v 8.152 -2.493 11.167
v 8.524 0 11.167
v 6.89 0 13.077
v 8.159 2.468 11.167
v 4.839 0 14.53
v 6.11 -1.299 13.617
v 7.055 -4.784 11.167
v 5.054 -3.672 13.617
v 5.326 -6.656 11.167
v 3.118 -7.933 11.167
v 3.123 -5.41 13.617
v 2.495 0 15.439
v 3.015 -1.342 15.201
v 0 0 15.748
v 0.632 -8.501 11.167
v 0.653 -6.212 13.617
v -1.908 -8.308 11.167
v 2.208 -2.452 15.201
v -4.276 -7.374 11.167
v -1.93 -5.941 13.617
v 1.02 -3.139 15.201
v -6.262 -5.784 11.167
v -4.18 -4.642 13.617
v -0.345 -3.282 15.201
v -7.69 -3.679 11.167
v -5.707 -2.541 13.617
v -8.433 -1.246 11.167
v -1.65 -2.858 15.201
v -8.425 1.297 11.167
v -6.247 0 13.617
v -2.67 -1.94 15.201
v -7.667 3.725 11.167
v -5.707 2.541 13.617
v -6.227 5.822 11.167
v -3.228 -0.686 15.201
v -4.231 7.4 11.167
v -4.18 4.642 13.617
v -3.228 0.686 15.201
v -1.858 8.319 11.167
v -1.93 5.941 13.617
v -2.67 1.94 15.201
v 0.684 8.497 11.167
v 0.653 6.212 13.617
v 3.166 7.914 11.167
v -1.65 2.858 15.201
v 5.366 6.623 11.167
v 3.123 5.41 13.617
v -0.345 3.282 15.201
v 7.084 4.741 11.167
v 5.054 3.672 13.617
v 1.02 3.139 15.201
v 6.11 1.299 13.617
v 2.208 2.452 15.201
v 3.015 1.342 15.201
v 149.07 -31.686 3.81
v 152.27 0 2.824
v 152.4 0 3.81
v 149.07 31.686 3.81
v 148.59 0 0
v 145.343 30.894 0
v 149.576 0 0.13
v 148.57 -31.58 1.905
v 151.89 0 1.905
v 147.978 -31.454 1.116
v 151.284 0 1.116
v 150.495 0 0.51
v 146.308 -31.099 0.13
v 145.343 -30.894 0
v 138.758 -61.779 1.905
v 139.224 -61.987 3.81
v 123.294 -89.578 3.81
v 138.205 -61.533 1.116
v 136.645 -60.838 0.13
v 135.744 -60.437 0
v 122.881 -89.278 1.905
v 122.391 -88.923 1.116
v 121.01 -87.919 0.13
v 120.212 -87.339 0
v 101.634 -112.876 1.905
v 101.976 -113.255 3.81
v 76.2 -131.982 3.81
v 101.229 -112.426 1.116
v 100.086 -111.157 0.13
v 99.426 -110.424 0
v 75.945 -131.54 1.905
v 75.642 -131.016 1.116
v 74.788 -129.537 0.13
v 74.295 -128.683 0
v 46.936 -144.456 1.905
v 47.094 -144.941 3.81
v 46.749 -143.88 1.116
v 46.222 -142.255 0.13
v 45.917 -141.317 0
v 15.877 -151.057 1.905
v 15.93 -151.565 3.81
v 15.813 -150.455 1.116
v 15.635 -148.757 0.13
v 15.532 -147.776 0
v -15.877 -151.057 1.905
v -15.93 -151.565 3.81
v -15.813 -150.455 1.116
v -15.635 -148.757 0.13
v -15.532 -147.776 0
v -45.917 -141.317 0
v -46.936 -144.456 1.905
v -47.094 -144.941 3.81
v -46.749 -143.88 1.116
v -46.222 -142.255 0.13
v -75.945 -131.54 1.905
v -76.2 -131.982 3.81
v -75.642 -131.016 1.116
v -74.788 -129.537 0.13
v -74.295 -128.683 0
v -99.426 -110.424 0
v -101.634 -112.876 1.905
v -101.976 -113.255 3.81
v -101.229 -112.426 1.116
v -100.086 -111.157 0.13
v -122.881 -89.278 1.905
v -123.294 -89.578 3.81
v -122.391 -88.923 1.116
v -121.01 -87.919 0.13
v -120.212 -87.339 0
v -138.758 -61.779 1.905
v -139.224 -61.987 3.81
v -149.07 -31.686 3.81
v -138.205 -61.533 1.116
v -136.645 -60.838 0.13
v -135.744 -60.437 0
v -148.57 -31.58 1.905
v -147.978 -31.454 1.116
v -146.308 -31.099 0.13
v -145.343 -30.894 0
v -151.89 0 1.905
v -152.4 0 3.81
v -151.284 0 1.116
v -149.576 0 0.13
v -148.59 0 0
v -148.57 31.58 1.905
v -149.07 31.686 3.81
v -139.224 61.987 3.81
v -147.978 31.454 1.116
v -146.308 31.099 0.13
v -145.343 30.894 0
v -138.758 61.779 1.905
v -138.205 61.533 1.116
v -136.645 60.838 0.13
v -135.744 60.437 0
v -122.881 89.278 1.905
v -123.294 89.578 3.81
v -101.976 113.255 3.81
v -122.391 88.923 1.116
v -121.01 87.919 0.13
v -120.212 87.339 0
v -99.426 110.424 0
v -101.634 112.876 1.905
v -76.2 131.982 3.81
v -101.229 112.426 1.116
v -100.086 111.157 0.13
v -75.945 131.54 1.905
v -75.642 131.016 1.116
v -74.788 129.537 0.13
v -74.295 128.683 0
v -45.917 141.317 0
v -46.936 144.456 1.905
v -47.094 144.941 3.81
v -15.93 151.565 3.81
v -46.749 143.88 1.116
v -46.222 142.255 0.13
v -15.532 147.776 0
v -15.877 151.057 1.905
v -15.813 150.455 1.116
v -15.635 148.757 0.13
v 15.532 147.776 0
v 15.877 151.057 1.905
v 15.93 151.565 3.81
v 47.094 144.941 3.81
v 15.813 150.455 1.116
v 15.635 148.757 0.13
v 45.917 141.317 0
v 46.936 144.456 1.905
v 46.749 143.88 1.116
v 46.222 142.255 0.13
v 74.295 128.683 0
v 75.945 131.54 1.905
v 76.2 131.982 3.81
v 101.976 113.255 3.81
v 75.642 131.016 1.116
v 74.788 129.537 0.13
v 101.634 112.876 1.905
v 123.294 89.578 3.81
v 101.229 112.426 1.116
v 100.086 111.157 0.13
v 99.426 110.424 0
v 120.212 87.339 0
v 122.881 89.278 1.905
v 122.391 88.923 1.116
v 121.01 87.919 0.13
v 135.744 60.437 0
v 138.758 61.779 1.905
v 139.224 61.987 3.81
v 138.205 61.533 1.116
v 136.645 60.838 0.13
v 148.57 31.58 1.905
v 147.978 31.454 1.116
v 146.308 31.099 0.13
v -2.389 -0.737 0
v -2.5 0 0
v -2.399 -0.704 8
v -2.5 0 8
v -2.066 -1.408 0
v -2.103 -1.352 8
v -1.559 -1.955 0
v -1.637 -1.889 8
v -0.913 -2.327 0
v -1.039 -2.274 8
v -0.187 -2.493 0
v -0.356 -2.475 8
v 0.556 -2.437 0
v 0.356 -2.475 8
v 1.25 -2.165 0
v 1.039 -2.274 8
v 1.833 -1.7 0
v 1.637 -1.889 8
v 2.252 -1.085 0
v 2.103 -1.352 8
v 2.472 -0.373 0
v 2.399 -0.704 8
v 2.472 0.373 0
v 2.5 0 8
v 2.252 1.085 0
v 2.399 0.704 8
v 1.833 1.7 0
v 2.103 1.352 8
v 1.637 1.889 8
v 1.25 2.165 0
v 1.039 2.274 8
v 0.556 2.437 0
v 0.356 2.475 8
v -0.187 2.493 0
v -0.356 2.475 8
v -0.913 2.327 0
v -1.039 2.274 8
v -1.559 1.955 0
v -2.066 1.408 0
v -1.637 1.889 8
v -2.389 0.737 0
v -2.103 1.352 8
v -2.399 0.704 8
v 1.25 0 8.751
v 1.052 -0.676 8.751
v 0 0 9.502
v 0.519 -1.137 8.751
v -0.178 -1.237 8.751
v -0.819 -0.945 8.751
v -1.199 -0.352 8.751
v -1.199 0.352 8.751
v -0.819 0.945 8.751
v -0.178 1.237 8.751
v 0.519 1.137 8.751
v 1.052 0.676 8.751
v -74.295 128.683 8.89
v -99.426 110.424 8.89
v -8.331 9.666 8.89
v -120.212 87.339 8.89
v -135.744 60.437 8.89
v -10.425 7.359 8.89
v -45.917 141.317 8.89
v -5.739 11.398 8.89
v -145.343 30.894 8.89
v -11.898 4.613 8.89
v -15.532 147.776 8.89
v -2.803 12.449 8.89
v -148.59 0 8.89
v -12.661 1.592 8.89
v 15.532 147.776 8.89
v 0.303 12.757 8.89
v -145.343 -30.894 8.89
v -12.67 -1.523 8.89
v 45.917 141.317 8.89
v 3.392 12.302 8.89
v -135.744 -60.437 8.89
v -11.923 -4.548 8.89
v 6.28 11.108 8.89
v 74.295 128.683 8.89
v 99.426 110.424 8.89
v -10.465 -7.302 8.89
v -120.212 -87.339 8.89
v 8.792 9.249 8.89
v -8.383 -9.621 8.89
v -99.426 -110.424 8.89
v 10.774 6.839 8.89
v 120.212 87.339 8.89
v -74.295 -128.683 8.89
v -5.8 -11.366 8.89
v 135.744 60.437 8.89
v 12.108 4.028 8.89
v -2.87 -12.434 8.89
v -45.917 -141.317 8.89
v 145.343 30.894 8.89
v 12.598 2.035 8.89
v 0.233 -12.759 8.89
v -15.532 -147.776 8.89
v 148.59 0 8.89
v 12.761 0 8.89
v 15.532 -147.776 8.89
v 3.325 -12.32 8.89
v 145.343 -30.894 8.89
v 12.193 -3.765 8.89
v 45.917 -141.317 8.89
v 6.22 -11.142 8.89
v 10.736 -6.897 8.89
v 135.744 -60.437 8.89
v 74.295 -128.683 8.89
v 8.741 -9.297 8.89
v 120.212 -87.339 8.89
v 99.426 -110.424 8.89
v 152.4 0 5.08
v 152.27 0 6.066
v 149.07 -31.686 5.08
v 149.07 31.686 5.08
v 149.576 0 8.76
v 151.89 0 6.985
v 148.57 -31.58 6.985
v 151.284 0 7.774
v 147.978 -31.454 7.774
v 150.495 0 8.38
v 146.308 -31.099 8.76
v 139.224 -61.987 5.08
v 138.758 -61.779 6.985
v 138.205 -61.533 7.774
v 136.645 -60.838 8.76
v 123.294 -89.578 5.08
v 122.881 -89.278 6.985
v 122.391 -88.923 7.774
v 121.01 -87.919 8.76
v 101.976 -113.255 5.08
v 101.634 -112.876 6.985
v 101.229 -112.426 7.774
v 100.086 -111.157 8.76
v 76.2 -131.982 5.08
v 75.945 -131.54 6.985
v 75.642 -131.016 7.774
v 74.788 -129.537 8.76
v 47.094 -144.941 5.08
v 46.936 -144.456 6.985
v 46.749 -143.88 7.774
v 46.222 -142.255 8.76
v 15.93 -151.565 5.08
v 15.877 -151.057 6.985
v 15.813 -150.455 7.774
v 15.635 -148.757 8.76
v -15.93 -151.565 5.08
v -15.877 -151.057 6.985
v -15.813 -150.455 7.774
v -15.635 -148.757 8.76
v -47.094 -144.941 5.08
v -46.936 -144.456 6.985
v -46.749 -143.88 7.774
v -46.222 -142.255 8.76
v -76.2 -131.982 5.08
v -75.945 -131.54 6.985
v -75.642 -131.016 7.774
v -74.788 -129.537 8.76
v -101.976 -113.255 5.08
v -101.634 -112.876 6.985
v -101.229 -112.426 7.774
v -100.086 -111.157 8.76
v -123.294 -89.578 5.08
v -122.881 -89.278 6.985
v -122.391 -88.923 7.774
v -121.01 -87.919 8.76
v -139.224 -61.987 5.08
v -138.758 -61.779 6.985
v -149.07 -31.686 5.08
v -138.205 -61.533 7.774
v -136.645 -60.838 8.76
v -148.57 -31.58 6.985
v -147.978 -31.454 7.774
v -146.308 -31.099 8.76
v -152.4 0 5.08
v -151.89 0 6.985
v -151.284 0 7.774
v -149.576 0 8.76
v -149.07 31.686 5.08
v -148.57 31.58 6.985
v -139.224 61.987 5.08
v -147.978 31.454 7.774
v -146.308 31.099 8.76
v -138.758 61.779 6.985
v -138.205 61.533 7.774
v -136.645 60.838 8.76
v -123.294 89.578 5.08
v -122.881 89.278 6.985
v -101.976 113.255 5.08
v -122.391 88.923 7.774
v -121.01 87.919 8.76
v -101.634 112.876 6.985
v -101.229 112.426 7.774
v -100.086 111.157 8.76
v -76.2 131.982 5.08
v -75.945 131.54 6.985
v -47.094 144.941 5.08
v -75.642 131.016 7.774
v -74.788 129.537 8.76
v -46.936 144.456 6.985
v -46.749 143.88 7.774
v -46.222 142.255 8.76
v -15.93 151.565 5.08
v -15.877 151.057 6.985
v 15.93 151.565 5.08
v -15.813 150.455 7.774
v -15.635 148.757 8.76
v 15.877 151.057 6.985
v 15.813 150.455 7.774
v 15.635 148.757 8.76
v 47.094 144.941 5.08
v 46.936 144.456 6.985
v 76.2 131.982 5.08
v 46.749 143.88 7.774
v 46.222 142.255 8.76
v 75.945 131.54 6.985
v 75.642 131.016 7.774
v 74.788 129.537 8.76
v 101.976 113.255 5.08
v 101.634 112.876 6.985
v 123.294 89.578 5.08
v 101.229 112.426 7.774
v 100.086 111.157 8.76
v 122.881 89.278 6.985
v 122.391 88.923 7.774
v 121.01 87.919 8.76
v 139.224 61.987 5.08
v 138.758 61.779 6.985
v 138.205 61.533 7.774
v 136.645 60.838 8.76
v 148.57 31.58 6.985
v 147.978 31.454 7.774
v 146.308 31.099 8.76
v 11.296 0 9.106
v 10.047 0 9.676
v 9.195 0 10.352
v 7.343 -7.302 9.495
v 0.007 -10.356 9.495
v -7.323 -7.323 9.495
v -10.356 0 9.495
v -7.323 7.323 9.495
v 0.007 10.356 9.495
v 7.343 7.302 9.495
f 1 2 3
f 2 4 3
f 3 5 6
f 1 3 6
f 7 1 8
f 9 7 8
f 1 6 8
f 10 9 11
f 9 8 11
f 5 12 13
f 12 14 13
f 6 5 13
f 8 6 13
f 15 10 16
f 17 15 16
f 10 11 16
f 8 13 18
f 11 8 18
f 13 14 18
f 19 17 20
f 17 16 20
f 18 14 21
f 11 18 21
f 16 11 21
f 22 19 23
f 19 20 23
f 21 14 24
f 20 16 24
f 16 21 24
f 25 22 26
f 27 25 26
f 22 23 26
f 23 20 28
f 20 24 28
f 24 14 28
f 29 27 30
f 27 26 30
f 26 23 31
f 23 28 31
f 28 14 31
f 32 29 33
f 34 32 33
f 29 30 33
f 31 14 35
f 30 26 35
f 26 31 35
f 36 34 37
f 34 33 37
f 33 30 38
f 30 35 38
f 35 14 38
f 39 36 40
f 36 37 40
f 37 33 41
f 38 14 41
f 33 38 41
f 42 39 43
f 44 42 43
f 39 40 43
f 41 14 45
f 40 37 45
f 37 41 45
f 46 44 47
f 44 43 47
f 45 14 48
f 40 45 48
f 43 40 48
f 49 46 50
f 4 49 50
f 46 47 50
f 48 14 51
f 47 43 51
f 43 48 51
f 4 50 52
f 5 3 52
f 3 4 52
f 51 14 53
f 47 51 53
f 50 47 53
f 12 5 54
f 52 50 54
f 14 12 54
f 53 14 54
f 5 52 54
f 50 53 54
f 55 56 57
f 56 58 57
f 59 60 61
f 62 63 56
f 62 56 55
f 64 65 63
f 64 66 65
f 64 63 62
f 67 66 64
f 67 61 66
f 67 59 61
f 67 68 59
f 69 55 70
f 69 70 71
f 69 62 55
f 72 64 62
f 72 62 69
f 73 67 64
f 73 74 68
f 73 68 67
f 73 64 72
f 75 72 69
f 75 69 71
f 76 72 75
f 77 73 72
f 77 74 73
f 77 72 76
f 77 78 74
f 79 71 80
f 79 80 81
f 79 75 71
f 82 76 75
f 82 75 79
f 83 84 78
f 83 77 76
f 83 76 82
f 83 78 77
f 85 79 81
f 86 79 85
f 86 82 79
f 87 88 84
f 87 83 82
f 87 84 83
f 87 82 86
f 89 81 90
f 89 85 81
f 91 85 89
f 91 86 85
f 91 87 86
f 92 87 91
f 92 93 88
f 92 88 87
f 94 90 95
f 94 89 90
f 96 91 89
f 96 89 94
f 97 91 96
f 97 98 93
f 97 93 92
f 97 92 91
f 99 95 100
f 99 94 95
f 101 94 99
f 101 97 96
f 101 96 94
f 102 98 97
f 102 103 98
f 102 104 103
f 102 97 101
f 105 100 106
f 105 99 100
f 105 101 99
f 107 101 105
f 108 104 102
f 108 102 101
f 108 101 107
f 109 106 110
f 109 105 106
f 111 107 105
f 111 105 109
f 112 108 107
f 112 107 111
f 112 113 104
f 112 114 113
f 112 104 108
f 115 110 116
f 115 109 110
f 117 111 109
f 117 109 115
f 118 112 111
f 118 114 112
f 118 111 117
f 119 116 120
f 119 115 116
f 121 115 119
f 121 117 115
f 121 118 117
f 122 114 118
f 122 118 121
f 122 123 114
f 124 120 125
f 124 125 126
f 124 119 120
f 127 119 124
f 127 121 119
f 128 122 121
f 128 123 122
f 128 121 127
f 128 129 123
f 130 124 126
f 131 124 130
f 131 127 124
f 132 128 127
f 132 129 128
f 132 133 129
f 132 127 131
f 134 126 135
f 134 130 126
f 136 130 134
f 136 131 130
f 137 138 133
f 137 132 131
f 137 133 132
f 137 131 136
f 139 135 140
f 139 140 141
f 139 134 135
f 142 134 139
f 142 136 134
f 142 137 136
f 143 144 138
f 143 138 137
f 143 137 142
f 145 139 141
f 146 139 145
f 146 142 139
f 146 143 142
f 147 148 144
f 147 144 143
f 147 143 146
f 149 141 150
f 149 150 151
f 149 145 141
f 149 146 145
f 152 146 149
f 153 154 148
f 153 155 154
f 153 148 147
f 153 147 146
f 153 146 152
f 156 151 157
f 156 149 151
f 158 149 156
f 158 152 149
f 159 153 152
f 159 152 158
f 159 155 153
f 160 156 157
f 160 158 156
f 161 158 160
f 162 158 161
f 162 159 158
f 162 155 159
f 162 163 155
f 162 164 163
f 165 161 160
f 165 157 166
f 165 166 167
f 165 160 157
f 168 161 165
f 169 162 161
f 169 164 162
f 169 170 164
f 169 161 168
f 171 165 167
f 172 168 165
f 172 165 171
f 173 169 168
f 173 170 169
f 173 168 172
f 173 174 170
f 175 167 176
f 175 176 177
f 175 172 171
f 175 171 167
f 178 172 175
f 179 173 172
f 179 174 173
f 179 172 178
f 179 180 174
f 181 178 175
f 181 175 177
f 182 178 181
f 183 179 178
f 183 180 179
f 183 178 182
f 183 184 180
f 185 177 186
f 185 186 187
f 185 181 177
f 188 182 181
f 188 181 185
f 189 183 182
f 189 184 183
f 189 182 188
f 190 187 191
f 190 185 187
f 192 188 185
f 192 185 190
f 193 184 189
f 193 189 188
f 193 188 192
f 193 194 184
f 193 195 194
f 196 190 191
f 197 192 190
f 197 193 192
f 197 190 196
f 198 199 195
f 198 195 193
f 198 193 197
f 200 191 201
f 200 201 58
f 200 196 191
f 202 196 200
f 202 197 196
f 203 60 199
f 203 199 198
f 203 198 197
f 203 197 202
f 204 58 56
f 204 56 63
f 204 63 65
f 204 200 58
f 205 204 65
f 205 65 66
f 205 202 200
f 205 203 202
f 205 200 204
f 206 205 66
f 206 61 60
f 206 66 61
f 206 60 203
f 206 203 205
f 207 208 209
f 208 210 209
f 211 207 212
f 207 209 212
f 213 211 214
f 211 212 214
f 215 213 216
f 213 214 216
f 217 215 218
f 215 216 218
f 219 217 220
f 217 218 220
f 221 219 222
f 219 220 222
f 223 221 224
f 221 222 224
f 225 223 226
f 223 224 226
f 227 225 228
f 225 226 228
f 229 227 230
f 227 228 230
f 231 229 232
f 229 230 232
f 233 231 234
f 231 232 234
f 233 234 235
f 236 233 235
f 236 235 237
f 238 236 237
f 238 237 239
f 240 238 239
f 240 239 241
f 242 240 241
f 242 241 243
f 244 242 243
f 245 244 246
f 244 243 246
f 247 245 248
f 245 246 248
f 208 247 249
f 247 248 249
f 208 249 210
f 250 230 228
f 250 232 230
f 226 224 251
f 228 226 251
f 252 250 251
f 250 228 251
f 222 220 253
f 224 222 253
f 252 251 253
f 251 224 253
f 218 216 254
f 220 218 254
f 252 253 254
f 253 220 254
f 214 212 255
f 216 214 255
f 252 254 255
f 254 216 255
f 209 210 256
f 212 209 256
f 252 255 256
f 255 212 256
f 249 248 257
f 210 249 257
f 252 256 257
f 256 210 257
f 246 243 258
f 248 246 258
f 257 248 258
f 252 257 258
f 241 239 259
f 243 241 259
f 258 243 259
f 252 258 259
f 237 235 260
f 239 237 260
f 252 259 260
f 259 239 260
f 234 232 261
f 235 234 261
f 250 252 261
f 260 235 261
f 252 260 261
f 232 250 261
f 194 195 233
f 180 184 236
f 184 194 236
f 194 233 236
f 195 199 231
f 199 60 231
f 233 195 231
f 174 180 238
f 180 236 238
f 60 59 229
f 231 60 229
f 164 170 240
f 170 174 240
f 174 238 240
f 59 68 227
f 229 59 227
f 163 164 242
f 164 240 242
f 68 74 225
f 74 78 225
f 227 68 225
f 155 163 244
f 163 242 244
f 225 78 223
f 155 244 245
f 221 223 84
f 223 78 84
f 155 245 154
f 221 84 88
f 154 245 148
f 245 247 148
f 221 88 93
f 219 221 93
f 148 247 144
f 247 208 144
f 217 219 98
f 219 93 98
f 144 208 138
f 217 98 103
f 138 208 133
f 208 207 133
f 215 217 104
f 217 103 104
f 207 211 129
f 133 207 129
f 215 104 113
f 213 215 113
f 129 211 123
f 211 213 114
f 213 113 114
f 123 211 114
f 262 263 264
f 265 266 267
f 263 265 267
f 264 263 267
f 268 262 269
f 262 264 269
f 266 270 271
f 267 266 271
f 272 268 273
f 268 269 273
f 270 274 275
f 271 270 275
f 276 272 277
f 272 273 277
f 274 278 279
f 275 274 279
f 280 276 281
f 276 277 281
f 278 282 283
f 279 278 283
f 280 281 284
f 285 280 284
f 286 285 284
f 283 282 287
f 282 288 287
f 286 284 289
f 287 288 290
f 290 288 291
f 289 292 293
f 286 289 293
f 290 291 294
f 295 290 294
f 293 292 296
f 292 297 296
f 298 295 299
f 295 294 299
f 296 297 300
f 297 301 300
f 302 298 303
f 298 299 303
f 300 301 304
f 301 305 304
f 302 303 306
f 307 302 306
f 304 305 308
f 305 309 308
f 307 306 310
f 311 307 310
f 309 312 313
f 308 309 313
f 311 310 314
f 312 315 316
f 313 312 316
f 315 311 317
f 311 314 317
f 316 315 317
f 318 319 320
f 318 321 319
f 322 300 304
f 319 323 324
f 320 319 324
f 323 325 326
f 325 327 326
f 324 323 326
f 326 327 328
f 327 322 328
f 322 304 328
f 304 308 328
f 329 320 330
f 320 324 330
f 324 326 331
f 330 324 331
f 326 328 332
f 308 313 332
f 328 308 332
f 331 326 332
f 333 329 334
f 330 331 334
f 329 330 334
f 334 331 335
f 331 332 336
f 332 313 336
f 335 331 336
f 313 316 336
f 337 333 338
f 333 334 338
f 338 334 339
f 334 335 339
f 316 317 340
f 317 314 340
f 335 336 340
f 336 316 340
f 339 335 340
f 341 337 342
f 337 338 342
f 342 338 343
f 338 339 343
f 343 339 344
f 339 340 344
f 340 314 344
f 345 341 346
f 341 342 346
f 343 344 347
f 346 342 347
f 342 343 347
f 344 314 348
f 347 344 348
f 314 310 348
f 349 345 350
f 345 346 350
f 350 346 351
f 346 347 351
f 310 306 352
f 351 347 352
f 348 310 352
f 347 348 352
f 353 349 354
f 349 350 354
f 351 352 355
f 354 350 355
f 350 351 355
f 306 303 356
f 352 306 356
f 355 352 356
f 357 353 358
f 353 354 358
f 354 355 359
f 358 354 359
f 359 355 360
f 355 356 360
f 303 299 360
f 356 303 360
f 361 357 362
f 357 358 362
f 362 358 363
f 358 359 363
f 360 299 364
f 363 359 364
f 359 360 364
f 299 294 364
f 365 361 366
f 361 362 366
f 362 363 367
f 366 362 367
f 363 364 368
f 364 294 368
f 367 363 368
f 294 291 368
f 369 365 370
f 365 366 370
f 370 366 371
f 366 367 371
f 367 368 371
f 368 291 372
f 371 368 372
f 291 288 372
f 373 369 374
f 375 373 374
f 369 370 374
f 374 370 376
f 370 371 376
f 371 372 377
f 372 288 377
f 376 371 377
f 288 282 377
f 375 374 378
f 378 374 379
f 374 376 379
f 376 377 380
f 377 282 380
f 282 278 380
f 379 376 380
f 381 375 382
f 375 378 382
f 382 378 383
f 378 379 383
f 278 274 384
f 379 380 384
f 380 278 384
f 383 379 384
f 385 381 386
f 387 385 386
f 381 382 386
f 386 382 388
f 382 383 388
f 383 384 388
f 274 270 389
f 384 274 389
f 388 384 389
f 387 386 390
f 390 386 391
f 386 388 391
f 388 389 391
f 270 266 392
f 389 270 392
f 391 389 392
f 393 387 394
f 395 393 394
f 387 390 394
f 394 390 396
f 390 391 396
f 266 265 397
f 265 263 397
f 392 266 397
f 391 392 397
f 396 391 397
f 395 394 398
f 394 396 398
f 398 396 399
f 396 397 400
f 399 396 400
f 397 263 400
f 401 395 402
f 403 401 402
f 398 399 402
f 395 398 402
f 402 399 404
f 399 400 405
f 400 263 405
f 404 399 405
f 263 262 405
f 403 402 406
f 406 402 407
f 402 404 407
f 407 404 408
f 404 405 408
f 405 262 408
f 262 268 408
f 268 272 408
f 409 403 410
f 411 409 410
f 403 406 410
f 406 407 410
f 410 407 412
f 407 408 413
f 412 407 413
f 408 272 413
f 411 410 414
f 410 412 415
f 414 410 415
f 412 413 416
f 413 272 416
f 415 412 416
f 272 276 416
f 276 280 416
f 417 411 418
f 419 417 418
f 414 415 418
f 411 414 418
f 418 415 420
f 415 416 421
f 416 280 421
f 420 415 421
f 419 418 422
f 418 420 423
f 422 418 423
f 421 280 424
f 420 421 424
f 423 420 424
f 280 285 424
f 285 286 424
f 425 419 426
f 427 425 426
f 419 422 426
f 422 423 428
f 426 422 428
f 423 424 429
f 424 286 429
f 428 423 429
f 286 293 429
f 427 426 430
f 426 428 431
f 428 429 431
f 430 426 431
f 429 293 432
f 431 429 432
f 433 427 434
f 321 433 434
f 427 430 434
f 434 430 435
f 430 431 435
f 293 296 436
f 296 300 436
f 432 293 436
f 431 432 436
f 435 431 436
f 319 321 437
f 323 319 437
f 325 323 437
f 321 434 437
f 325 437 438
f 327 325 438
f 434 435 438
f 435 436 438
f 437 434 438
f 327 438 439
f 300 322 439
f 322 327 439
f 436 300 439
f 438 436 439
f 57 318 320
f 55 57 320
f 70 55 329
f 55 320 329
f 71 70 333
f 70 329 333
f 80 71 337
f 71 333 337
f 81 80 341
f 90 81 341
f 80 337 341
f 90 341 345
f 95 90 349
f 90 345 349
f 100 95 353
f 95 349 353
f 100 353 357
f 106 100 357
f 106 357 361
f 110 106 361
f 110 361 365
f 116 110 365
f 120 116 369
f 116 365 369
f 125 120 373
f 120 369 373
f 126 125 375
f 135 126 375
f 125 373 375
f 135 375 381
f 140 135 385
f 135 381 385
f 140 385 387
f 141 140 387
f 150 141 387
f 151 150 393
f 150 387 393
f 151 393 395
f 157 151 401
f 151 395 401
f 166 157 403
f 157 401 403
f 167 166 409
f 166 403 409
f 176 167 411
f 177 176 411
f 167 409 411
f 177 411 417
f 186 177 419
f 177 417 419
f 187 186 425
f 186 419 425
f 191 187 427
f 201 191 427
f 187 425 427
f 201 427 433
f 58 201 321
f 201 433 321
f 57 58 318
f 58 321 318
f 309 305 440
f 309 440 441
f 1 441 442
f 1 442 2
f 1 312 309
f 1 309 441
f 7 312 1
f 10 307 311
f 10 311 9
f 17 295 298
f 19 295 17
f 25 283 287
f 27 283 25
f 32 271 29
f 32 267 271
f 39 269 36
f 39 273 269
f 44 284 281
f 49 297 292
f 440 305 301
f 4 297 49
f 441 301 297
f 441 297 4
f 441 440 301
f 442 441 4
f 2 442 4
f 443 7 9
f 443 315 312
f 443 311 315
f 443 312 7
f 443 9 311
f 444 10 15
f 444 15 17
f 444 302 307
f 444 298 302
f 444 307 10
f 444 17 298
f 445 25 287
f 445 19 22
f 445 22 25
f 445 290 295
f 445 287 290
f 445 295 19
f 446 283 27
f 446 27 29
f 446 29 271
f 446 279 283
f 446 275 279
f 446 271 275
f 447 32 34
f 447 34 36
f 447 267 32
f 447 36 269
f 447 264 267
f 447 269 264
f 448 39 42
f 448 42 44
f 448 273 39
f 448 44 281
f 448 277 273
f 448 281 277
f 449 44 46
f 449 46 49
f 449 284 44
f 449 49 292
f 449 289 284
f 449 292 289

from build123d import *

# Parameters (mm, degrees)
F2_R     = 3.81
F3_R     = 3.81
F4_R     = 5.08
F6_D     = 5
F6_DEPTH = 8
F6_TIP   = 1.5021515476


with BuildPart() as f1:
    # F0 (on Front) → F1 (revolve)
    with BuildSketch(Plane.XZ):
        with BuildLine():
            Line((0, 15.748), (0, 0))
            Line((0, 0), (152.4, 0))
            Line((152.4, 0), (152.4, 8.89))
            Line((152.4, 8.89), (9.652, 8.89))
            ThreePointArc((9.652, 8.89), (5.9201619066, 13.8589315722), (0, 15.748))
        make_face()
    revolve(axis=Axis((0, 0, 7.874), (0, 0, -1)))

    # F2
    f2_edges = [f1.edges().sort_by_distance(p)[0] for p in [
        (-152.4, 0, 8.89),
    ]]
    fillet(f2_edges, radius=F2_R)

    # F3
    f3_edges = [f1.edges().sort_by_distance(p)[0] for p in [
        (-152.4, 0, 0),
    ]]
    fillet(f3_edges, radius=F3_R)

    # F4
    f4_edges = [f1.edges().sort_by_distance(p)[0] for p in [
        (-9.652, 0, 8.89),
    ]]
    fillet(f4_edges, radius=F4_R)

    # F6
    with Locations(Plane(origin=(0, 0, 0), x_dir=(1, 0, 0), z_dir=(0, 0, -1))):
        with Locations((0, 0)):
            Hole(F6_D / 2, depth=F6_DEPTH)
            with Locations((0, 0, -(F6_DEPTH + F6_TIP / 2))):  # 118° drill point
                Cone(0, F6_D / 2, F6_TIP, mode=Mode.SUBTRACT)


solid = f1.part
